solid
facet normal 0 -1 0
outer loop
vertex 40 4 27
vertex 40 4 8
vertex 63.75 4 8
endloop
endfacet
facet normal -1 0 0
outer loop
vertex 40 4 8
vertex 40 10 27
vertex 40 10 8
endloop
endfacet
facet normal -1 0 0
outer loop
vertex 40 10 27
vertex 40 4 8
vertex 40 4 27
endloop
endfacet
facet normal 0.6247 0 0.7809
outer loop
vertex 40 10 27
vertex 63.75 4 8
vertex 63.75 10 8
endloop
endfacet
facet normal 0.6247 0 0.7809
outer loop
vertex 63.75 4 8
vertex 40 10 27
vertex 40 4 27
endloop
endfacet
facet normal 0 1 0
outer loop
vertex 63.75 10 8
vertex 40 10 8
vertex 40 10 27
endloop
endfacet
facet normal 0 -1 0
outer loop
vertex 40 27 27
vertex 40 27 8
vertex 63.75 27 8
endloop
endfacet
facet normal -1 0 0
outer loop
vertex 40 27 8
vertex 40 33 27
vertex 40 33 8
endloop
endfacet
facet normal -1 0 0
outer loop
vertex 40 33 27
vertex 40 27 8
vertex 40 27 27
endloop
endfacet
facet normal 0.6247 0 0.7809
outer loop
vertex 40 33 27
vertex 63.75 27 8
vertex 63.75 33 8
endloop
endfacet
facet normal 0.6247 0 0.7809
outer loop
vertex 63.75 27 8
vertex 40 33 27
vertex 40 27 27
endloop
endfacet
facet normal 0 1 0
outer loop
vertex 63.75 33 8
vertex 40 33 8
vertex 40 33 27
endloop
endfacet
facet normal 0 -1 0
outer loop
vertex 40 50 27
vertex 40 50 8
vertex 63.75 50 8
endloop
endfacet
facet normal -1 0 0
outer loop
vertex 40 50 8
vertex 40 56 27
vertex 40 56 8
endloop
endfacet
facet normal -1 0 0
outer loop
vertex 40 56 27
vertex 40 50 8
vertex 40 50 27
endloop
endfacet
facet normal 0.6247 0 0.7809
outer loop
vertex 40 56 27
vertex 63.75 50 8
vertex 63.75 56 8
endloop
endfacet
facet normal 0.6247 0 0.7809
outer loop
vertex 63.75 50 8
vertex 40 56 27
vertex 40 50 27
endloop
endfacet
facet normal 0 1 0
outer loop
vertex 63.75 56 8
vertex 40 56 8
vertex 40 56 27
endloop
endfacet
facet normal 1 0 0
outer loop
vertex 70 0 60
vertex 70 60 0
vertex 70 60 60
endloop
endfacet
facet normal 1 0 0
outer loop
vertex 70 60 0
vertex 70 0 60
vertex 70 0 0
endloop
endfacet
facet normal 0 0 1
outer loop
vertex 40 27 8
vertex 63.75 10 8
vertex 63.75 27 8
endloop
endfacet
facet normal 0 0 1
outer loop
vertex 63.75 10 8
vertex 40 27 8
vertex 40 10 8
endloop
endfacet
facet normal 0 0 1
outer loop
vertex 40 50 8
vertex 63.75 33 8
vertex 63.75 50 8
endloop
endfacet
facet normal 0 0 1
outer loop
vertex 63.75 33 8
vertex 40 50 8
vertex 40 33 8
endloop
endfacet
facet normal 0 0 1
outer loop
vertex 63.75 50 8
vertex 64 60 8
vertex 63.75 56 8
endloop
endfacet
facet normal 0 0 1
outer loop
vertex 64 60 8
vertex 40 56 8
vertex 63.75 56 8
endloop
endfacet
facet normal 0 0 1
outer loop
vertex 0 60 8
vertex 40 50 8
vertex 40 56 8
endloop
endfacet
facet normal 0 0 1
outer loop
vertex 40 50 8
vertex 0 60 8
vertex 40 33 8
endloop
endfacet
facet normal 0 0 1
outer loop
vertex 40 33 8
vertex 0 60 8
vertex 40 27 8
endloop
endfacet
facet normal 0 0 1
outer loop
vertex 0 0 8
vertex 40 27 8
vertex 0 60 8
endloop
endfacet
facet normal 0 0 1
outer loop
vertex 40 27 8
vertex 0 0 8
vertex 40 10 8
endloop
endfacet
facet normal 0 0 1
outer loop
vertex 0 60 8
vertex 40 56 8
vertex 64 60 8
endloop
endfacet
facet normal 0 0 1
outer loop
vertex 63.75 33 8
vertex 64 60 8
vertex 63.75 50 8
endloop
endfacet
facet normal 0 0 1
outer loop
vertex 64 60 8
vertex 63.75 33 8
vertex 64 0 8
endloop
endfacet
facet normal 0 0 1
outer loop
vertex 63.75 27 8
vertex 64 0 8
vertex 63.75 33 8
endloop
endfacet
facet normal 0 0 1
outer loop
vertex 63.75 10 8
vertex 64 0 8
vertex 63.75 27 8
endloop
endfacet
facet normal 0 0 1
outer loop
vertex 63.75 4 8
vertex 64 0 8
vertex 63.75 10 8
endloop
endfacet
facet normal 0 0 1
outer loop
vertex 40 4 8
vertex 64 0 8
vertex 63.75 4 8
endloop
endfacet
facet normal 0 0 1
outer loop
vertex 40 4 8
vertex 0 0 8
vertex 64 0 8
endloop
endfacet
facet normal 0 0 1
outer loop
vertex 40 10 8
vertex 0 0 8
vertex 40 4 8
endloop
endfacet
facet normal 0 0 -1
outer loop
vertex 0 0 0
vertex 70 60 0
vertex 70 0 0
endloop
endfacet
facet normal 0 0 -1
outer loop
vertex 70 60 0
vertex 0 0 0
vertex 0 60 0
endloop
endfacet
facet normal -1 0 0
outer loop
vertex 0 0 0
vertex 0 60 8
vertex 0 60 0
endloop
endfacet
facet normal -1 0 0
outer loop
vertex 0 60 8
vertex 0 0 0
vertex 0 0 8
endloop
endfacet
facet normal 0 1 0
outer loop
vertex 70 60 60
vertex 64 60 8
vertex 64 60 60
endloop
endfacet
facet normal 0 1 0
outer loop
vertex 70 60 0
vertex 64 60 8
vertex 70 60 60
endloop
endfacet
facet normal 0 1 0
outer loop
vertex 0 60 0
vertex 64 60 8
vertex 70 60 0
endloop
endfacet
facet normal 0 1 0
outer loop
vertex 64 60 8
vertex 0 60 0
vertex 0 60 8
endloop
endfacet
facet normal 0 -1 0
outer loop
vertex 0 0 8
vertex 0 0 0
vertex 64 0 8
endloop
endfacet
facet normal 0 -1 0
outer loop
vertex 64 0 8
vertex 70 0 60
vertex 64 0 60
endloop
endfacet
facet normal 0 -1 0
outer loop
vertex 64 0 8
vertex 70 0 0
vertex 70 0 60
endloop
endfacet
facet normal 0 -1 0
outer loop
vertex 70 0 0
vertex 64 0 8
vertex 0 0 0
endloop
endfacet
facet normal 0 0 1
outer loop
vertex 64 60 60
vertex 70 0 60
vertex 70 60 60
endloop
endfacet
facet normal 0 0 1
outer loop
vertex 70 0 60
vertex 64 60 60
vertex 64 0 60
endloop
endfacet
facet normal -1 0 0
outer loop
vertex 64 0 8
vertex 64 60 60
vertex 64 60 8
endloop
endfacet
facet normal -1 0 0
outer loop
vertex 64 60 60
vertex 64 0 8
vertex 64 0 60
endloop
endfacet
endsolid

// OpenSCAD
$fn = 32;

// ----------------------------------------------------------------------
// Rib bracket: 3-gusset L bracket
// ----------------------------------------------------------------------

// --- parameters (mm) ---
base_l = 70;              // foot length, X
base_w = 60;              // foot width, Y
base_t = 8;               // foot thickness
plate_t = 6;              // upright plate thickness
plate_h = 60;             // overall height
gus_l = 24;               // gusset leg along the foot
gus_h = 20;               // gusset height
gus_t = 6;                // gusset thickness
gus_edge = 4;             // gusset margin from the foot edge
n_gus = 3;                // gusset count

gus_pitch = (base_w - 2 * gus_edge - gus_t) / (n_gus - 1);  // gusset pitch

union() {
  cube([base_l, base_w, base_t]);
  translate([base_l - plate_t, 0, base_t - 1])
    cube([plate_t, base_w, plate_h - base_t + 1]);
  for (i = [0 : n_gus - 1])
    translate([base_l - plate_t - gus_l, gus_edge + i * gus_pitch, base_t - 1])
      rotate([-90, 0, 0])
        linear_extrude(height = gus_t)
          polygon(points = [[0, 0], [gus_l + 1, 0], [0, -gus_h]]);
}
